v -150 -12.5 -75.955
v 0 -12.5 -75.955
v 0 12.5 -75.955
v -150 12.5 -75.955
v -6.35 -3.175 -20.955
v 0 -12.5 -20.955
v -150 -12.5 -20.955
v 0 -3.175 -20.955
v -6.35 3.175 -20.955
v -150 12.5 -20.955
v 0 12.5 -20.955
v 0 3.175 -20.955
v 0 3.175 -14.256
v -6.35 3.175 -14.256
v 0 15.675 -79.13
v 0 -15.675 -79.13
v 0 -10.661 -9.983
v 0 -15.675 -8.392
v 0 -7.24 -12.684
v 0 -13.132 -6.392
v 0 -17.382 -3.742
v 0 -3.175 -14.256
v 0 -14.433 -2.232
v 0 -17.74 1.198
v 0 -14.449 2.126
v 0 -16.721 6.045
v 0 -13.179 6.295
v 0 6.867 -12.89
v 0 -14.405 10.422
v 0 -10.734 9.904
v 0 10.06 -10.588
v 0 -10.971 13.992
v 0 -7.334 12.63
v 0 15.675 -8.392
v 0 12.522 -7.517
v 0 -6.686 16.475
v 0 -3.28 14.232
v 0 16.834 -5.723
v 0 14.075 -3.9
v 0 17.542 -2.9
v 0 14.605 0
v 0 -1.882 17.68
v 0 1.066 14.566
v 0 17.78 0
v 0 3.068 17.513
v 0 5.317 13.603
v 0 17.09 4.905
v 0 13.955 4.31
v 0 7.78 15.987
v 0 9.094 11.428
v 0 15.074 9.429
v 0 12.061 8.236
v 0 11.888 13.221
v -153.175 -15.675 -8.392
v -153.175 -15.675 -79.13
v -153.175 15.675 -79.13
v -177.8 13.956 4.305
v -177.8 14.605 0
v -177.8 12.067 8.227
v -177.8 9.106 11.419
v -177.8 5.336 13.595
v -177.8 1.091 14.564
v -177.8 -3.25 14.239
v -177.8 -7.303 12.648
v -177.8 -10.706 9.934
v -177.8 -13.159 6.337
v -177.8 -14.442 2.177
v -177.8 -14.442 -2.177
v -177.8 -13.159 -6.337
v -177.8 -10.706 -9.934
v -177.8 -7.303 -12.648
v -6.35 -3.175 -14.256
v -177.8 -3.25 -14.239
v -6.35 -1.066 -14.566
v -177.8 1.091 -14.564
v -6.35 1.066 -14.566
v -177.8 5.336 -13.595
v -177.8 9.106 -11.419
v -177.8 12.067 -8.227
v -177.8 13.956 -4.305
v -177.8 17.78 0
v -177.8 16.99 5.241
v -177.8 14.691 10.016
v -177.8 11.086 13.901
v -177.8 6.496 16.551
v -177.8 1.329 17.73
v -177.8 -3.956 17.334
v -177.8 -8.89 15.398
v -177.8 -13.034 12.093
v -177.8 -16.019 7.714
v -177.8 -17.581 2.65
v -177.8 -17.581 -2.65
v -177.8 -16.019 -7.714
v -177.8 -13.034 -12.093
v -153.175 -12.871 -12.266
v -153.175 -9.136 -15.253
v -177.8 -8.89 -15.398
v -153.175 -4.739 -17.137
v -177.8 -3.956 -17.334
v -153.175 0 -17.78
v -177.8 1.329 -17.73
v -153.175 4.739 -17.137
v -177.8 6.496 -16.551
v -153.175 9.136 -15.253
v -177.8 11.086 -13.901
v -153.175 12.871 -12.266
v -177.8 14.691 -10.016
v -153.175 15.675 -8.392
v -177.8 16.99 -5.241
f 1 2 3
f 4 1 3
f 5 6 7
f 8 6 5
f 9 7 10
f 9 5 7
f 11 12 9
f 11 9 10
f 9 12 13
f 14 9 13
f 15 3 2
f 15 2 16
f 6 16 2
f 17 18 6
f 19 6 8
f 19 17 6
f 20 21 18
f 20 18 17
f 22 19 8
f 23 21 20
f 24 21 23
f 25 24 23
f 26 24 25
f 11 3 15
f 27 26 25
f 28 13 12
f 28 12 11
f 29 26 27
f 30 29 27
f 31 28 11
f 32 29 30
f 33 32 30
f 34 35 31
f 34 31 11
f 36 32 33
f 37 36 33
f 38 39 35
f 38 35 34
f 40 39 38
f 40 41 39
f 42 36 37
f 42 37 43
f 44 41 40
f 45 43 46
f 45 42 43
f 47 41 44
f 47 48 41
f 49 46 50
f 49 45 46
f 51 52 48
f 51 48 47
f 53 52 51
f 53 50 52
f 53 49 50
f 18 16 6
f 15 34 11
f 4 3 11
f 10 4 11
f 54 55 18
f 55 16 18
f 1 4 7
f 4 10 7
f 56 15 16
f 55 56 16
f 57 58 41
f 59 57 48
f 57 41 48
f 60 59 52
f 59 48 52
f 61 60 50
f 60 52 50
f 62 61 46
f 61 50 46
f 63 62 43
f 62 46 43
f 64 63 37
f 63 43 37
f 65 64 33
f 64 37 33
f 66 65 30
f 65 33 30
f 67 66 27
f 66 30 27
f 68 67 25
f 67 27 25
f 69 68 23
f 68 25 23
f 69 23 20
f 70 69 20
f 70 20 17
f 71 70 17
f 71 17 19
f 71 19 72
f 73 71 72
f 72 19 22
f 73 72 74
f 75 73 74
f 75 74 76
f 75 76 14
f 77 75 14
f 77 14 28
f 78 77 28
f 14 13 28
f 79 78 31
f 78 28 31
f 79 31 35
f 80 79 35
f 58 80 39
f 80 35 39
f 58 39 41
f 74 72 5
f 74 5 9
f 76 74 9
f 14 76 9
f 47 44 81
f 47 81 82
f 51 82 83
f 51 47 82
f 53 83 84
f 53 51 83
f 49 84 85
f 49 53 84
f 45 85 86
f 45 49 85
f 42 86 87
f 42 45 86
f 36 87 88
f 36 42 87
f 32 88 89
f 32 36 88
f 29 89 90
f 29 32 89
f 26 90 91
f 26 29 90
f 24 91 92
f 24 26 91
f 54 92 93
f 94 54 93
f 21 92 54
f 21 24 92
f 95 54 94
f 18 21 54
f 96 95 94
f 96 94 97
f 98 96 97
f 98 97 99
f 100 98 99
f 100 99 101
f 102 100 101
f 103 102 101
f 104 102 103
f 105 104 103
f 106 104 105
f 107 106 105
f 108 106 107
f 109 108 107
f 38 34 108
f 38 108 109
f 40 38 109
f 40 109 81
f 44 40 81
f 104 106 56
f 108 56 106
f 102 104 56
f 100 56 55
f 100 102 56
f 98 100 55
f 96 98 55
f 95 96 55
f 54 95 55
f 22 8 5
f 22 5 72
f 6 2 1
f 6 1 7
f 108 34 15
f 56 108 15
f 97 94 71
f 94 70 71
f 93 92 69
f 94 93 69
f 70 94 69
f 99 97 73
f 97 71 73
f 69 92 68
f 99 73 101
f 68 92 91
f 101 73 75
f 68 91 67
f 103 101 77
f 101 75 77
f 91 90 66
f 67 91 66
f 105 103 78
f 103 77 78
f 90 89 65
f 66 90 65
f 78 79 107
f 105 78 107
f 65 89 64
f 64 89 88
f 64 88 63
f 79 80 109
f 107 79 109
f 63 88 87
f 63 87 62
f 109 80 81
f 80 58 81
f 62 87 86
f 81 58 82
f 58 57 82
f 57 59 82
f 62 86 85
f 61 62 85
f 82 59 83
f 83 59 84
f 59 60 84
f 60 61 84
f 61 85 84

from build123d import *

# Parameters (mm, degrees)
F0_R     = 17.78
F0_R_2   = 14.605
F1_DEPTH = 177.8
F2_W     = 25
F2_H     = 55
F3_DEPTH = 150
F5_DEPTH = 3.175
F6_W     = 6.35
F6_H     = 13.6751307396
F7_DEPTH = 6.35


with BuildPart() as f1:
    # F0 (on Right) → F1 (new body)
    with BuildSketch(Plane.YZ):
        Circle(F0_R)
        Circle(F0_R_2, mode=Mode.SUBTRACT)
    extrude(amount=-F1_DEPTH)

    # F2 (on Right) → F3 (join)
    with BuildSketch(Plane.YZ):
        Polygon((-7.21e-08, -17.78), (-15.675, -17.78), (-15.675, -79.13), (15.675, -79.13), (15.675, -17.78), align=None)
        with Locations((0, -48.455)):
            Rectangle(F2_W, F2_H, mode=Mode.SUBTRACT)
        with BuildLine():
            Line((-15.675, -8.39182787), (-15.675, -17.78))
            Line((-15.675, -17.78), (-7.21e-08, -17.78))
            ThreePointArc((-7.21e-08, -17.78), (-9.1356910412, -15.2534438472), (-15.675, -8.39182787))
        make_face()
        with BuildLine():
            ThreePointArc((15.675, -8.39182787), (9.1356909794, -15.2534438842), (-7.21e-08, -17.78))
            Line((-7.21e-08, -17.78), (15.675, -17.78))
            Line((15.675, -17.78), (15.675, -8.39182787))
        make_face()
    extrude(amount=-F3_DEPTH)

    # F4 (on face) → F5 (join)
    with BuildSketch(Plane(origin=(-150, 0, 0), x_dir=(0, -1, 0), z_dir=(-1, 0, 0))):
        Polygon((-15.675, -17.78), (-15.675, -79.13), (15.675, -79.13), (15.675, -17.78), (0, -17.78), align=None)
        with BuildLine():
            Line((-15.675, -8.39182787), (-15.675, -17.78))
            Line((-15.675, -17.78), (0, -17.78))
            ThreePointArc((0, -17.78), (-9.1356910103, -15.2534438657), (-15.675, -8.39182787))
        make_face()
        with BuildLine():
            Line((0, -17.78), (15.675, -17.78))
            Line((15.675, -17.78), (15.675, -8.39182787))
            ThreePointArc((15.675, -8.39182787), (9.1356910103, -15.2534438657), (0, -17.78))
        make_face()
    extrude(amount=F5_DEPTH)

    # F6 (on Right) → F7 (cut)
    with BuildSketch(Plane.YZ):
        with Locations((0, -18.0660898343)):
            Rectangle(F6_W, F6_H)
    extrude(amount=-F7_DEPTH, mode=Mode.SUBTRACT)


solid = f1.part
